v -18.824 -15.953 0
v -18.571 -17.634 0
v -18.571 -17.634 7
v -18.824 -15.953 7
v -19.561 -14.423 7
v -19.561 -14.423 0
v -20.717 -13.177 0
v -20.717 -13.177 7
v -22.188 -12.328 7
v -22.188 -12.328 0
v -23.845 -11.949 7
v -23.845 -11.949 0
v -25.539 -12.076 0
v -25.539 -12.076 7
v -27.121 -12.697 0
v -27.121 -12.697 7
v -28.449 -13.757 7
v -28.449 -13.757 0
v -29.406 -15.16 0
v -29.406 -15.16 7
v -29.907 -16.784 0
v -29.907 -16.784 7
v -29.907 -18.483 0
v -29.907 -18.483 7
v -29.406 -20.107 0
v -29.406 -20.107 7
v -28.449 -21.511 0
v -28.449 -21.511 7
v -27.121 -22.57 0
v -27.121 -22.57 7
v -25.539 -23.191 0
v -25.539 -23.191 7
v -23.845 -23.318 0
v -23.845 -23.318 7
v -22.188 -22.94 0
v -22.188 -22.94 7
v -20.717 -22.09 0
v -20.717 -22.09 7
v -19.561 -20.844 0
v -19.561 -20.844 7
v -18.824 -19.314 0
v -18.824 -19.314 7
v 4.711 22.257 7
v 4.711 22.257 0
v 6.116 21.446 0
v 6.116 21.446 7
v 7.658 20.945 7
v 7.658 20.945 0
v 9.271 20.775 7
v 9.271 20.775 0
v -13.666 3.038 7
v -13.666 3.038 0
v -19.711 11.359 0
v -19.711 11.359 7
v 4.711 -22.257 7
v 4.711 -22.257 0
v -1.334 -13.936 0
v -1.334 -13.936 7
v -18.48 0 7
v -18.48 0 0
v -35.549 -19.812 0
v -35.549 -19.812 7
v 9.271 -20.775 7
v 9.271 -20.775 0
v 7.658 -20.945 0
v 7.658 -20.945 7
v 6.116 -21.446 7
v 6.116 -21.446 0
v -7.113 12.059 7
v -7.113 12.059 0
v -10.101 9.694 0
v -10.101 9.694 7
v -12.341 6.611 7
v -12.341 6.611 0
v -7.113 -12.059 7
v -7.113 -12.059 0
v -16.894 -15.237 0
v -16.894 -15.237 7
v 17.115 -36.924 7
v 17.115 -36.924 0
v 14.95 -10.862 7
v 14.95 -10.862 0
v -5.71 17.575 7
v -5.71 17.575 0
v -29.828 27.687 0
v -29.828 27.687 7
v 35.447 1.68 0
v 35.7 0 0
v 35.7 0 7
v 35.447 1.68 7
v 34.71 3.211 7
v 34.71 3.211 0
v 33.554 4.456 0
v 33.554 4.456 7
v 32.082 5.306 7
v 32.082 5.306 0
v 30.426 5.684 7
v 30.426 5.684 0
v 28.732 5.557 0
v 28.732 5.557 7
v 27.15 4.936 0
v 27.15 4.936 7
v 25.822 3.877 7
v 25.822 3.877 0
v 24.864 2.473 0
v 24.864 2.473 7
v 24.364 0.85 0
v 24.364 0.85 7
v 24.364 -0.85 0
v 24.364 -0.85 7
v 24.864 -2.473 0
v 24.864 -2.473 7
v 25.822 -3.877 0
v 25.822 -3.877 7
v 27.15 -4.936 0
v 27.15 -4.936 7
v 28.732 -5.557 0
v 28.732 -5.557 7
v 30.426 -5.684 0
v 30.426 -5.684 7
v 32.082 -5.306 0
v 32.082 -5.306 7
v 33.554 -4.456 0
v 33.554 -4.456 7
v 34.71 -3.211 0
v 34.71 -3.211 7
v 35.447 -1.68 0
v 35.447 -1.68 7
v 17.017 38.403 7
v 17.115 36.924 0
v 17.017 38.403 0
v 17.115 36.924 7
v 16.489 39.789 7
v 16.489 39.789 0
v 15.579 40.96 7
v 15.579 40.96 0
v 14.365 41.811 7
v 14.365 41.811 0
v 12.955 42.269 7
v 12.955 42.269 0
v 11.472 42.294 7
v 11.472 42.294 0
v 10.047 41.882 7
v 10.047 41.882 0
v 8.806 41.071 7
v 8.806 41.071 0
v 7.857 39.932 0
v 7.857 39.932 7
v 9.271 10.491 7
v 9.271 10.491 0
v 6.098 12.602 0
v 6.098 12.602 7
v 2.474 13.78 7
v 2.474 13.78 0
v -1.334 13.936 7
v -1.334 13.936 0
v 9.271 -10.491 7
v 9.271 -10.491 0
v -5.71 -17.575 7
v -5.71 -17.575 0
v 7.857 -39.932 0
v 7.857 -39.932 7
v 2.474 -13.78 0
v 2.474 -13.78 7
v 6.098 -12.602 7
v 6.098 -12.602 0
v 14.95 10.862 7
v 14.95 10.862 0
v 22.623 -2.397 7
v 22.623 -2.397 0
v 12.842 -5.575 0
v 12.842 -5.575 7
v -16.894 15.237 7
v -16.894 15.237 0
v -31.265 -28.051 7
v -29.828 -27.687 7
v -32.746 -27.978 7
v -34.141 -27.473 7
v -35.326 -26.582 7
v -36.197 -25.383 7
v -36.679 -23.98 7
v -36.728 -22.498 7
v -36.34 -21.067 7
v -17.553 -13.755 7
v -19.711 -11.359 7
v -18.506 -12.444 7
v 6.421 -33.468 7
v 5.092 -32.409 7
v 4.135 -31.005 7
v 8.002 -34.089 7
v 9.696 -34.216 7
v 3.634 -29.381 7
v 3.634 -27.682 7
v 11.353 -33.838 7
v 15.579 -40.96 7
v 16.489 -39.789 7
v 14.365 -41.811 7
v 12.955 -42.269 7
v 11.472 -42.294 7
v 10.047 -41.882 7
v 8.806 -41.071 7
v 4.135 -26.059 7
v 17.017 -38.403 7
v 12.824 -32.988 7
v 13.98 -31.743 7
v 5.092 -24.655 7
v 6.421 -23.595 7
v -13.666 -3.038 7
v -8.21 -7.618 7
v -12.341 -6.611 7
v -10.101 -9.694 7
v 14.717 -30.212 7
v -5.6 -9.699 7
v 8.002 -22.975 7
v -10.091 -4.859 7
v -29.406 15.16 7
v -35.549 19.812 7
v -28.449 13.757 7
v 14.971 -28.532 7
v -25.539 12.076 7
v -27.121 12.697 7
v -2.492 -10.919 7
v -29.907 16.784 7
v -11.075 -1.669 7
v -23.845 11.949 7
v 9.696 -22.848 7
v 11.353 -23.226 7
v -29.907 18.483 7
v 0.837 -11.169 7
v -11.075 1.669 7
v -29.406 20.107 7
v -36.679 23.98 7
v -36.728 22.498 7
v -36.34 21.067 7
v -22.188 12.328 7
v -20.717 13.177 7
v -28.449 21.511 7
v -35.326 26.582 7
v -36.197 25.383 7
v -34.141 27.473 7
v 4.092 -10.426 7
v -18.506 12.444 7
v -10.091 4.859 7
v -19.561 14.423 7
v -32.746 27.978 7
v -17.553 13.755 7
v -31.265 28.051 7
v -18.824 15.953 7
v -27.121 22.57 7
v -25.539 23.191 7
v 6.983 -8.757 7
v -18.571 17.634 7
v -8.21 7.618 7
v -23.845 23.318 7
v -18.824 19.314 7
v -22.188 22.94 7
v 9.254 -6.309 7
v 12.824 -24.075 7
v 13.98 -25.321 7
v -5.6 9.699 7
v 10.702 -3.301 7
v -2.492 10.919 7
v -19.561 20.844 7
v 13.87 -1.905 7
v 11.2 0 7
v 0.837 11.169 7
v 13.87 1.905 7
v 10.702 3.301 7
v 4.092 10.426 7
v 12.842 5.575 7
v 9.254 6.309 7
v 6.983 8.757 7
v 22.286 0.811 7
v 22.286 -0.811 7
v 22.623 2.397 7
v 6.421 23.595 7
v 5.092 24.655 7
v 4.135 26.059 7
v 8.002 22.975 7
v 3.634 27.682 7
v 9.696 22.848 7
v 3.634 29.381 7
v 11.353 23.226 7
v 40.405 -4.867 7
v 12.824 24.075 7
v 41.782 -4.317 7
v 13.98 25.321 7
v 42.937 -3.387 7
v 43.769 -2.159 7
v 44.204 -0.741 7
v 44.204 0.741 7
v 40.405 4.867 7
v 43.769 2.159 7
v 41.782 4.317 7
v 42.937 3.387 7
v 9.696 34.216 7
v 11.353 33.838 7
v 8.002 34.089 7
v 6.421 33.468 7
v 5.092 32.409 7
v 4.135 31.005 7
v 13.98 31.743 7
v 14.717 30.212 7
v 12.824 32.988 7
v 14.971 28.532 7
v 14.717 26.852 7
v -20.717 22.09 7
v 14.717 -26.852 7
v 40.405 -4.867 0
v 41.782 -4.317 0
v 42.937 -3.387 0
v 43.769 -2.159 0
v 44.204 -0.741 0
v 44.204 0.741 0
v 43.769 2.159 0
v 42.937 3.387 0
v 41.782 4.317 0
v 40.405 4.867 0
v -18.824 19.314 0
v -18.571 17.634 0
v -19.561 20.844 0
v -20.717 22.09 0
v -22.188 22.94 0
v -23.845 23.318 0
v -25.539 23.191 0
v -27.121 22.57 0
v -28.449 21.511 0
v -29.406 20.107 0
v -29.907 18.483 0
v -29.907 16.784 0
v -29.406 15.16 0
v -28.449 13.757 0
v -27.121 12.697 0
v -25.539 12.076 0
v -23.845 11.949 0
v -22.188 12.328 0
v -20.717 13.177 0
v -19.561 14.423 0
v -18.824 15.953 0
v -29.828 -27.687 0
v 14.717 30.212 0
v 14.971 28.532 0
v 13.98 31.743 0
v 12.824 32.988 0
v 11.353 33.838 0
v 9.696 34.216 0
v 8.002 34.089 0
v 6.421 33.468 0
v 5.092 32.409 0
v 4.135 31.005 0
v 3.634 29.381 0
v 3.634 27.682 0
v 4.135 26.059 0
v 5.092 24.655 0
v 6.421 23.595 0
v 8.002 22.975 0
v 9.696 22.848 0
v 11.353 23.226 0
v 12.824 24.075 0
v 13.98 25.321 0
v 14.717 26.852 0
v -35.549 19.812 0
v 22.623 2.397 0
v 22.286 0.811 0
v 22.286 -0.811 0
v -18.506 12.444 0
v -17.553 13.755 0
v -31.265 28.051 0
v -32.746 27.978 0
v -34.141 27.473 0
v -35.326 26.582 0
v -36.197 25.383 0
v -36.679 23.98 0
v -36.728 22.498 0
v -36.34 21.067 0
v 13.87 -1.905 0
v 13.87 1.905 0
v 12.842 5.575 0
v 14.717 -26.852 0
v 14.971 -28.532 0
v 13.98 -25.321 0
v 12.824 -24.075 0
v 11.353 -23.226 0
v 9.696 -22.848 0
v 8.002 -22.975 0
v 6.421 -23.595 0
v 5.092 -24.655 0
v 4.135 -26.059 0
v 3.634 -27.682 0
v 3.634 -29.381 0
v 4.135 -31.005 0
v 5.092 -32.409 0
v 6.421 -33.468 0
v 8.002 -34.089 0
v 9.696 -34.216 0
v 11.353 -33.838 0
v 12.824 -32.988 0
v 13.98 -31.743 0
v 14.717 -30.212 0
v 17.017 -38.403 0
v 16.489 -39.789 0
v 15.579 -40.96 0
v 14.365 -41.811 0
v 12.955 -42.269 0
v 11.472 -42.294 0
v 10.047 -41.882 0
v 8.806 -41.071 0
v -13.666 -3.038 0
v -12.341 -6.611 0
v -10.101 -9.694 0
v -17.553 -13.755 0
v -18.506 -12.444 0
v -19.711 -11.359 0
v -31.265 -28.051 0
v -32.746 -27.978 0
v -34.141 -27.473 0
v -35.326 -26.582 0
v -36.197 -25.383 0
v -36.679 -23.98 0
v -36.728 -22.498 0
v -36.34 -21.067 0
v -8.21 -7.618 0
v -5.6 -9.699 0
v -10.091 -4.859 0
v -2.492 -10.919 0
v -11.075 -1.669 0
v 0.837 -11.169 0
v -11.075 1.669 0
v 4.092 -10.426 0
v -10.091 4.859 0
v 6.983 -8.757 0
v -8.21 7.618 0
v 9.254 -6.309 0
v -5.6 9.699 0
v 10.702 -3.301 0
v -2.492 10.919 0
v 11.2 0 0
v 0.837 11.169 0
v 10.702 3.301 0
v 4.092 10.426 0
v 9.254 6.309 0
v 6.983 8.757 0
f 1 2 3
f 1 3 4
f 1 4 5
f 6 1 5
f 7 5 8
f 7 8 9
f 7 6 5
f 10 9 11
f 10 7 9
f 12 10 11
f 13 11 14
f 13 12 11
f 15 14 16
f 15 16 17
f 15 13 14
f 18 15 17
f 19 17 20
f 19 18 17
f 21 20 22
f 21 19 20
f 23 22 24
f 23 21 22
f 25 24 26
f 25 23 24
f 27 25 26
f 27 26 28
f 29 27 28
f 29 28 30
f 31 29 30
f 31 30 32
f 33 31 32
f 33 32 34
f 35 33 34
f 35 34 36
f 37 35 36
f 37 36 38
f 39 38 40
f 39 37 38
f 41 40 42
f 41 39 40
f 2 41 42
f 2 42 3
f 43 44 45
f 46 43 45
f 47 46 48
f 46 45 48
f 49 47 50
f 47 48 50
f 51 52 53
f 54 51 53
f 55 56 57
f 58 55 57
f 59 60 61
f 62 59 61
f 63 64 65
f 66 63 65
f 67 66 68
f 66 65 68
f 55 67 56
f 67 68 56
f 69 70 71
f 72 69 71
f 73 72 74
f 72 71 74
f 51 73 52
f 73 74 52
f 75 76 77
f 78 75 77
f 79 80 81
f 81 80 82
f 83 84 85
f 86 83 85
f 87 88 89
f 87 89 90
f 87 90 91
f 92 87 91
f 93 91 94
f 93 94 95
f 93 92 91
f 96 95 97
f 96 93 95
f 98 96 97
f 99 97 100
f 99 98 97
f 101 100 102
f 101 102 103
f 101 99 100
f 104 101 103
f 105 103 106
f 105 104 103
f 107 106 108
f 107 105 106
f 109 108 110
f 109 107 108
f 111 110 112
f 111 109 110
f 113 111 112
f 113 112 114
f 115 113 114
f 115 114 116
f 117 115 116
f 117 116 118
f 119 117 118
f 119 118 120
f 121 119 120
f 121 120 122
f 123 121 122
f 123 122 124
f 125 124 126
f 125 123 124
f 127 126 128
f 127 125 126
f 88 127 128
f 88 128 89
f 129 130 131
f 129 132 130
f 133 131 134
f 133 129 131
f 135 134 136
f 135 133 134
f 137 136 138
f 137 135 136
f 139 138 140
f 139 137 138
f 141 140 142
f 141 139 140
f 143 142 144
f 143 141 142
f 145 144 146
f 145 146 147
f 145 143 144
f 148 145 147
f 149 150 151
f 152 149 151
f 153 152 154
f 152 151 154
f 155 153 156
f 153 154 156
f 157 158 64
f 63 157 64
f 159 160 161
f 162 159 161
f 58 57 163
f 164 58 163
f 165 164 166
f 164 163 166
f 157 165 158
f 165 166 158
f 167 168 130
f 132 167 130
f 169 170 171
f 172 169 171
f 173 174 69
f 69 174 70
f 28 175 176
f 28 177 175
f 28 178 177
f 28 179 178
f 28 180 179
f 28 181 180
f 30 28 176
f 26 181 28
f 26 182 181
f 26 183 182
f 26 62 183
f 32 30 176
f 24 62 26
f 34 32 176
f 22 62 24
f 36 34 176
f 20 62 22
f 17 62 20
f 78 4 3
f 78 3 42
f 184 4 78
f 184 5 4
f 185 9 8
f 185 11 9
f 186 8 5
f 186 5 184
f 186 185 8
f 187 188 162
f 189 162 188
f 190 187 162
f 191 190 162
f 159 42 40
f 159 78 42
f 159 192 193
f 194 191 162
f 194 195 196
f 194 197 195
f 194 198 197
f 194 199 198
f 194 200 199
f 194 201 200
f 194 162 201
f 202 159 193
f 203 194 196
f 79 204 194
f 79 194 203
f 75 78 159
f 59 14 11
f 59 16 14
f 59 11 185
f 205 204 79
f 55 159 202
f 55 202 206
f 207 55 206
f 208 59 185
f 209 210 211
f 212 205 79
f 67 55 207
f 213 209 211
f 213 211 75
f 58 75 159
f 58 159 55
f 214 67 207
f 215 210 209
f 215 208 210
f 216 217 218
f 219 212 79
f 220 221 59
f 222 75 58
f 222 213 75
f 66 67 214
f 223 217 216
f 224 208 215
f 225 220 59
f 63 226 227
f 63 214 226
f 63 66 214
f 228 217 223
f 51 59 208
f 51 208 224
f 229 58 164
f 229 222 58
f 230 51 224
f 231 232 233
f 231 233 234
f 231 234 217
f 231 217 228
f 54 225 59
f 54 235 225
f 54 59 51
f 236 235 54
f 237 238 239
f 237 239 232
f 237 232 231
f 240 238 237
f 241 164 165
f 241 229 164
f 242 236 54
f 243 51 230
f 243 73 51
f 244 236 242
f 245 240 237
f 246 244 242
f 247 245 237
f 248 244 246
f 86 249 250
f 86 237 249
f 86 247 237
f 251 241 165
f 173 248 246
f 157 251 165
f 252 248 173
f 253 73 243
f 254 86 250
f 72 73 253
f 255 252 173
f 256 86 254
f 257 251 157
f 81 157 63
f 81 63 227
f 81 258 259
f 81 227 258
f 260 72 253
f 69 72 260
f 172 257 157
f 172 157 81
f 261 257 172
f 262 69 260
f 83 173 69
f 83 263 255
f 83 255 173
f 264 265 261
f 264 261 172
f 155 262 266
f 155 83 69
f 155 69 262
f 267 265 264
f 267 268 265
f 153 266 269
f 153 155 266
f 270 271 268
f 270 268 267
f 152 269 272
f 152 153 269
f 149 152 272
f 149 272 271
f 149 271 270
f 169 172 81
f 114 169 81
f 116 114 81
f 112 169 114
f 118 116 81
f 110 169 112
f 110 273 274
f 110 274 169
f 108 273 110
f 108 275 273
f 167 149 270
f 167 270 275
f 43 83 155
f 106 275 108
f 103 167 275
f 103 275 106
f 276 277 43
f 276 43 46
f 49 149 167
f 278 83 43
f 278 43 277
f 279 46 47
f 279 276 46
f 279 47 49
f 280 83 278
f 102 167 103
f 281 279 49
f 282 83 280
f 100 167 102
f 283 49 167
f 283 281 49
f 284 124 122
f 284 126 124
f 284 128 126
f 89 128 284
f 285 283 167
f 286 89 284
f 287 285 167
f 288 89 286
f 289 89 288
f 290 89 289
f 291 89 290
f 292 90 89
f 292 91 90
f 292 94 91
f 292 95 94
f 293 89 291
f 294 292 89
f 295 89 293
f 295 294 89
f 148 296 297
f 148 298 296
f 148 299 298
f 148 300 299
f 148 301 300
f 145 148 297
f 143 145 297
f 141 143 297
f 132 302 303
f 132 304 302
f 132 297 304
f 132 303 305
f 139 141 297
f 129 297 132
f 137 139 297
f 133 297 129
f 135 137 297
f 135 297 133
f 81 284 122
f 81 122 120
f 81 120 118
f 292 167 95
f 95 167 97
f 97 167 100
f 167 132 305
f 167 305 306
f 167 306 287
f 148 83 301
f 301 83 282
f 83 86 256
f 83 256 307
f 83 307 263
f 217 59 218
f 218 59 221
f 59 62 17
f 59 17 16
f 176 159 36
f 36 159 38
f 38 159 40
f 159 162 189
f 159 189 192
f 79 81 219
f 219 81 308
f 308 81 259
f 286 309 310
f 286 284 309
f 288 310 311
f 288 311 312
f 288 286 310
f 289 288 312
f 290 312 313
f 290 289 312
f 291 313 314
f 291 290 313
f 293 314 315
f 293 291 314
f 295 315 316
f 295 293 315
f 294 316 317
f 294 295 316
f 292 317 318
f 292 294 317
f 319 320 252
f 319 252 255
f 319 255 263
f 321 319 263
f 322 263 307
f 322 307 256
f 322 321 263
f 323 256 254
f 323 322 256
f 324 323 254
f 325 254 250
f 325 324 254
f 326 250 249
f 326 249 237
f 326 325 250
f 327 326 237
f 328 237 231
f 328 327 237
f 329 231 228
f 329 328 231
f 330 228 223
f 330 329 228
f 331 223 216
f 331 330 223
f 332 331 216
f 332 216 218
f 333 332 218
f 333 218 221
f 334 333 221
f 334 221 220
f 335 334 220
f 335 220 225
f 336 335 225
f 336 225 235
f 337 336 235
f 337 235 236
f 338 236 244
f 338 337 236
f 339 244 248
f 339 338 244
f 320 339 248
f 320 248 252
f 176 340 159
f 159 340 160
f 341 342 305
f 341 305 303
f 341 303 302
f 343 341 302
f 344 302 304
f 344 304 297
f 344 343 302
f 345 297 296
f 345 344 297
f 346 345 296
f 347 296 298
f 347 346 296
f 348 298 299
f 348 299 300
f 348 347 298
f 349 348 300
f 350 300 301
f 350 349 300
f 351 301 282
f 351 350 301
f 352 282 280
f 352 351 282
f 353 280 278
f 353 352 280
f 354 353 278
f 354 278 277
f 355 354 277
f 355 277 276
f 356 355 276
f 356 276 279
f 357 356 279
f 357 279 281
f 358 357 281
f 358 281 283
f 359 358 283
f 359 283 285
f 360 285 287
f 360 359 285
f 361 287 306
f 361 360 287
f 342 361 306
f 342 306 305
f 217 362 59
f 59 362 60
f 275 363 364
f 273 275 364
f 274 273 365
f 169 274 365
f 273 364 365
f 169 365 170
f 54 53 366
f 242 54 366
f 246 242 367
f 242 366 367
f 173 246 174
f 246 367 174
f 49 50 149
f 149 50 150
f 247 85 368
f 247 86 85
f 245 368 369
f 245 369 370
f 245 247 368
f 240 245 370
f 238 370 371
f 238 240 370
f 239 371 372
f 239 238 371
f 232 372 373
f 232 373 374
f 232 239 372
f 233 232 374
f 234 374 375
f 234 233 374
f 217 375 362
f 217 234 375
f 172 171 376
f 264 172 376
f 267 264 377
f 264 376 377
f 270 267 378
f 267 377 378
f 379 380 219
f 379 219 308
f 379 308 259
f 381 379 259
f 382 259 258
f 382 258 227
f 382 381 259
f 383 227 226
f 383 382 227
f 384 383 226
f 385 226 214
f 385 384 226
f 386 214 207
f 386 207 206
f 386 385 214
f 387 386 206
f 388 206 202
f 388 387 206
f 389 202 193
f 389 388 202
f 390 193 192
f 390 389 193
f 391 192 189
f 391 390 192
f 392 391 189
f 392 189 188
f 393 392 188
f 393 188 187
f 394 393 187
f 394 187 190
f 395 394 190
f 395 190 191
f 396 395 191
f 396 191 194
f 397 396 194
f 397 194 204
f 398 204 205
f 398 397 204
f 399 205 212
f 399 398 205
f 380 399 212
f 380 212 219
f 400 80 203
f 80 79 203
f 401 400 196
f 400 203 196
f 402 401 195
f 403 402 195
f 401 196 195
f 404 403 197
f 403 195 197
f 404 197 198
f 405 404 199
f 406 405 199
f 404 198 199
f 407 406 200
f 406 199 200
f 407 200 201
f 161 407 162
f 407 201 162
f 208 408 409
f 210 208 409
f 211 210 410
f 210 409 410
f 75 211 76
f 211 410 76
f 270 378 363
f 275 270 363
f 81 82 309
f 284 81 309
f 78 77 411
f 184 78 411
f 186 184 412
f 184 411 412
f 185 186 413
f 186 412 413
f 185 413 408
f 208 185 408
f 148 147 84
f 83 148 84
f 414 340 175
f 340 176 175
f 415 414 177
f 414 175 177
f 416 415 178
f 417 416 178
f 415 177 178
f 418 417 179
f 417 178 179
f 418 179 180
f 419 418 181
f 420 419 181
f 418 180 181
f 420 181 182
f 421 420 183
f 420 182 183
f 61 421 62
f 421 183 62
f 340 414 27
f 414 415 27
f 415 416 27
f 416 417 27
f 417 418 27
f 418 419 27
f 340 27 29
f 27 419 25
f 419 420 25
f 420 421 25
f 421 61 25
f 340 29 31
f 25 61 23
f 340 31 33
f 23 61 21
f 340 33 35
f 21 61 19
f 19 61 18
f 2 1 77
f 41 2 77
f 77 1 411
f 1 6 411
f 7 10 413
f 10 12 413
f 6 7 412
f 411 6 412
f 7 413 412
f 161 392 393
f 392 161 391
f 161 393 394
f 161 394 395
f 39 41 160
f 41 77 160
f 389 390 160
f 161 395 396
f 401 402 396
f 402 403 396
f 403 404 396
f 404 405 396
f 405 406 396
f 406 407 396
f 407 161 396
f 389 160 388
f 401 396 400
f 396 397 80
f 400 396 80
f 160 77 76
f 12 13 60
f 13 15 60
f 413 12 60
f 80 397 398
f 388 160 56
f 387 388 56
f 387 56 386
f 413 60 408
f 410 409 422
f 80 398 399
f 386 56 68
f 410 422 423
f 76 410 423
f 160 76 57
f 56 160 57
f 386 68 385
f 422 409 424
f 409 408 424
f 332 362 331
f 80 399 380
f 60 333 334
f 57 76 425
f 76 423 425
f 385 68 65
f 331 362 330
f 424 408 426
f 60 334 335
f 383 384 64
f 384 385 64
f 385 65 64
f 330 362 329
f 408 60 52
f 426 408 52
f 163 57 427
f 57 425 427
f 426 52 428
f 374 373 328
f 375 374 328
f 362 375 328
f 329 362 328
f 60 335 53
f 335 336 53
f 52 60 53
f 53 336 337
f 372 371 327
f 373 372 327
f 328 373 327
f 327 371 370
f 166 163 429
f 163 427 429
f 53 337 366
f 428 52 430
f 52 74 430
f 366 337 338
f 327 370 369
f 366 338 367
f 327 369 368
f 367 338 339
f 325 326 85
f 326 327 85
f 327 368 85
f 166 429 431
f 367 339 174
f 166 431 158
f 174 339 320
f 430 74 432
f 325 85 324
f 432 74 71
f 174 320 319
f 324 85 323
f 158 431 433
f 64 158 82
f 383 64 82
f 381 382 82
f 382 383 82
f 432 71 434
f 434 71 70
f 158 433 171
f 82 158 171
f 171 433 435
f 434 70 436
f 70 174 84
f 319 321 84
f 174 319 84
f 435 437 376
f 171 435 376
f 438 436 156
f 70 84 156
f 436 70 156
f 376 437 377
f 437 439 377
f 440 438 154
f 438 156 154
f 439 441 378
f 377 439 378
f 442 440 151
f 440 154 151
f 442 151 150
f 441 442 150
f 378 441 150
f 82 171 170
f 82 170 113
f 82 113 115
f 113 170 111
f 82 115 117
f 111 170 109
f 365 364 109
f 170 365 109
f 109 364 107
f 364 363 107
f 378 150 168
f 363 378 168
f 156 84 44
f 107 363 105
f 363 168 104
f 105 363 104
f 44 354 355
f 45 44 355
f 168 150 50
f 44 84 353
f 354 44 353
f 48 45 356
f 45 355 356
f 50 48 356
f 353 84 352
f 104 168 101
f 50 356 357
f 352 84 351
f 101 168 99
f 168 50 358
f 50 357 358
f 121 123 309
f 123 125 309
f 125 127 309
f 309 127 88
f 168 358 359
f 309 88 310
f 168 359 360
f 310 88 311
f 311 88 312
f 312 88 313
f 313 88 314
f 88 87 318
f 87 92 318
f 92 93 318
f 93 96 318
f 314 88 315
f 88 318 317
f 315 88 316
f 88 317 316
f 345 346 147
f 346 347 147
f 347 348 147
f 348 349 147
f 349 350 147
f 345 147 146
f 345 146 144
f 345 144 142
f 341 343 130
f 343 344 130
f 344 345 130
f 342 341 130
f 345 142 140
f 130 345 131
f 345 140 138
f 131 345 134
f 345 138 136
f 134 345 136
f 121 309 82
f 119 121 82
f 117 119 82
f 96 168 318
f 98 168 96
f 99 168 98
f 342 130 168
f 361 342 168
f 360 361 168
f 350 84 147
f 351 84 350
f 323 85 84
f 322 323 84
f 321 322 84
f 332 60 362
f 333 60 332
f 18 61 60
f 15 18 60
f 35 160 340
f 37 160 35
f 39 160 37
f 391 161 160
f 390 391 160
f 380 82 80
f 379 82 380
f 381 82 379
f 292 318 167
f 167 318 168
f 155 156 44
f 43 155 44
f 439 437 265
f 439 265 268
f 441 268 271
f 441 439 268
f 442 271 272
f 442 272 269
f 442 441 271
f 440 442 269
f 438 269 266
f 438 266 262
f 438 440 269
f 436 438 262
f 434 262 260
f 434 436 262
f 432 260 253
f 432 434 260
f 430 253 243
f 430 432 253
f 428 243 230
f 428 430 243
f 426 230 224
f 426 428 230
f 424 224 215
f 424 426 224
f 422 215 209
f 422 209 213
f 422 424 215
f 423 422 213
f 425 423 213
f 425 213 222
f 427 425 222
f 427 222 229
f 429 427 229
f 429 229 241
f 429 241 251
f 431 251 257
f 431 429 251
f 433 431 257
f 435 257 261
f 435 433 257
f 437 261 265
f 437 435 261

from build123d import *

# Parameters (mm, degrees)
F0_R     = 5.7
F0_R_2   = 11.2
F1_DEPTH = 7
F2_R     = 5


with BuildPart() as f1:
    # F0 (on Top) → F1 (new body)
    with BuildSketch(Plane.XY):
        Polygon((14.950241, -10.861986), (61.069731, 0), (14.950241, 10.861986), (18.871585, 58.080765), (-5.710484, 17.575063), (-49.40645, 35.895887), (-18.479514, 0), (-49.40645, -35.895887), (-5.710484, -17.575063), (18.871585, -58.080765), align=None)
        with Locations((-24.27051, -17.633558)):
            Circle(F0_R, mode=Mode.SUBTRACT)
        with BuildLine():
            Line((9.27051, -10.490836), (9.27051, -20.77537))
            ThreePointArc((9.27051, -20.77537), (6.873673, -21.154992), (4.711456, -22.256696))
            Line((4.711456, -22.256696), (-1.333641, -13.936334))
            ThreePointArc((-1.333641, -13.936334), (4.326238, -13.314791), (9.27051, -10.490836))
        make_face(mode=Mode.SUBTRACT)
        with BuildLine():
            Line((-7.112633, -12.058626), (-16.893806, -15.236721))
            ThreePointArc((-16.893806, -15.236721), (-17.995511, -13.074504), (-19.711456, -11.358558))
            Line((-19.711456, -11.358558), (-13.666359, -3.038196))
            ThreePointArc((-13.666359, -3.038196), (-11.326238, -8.228994), (-7.112633, -12.058626))
        make_face(mode=Mode.SUBTRACT)
        Circle(F0_R_2, mode=Mode.SUBTRACT)
        with Locations((9.27051, -28.531695)):
            Circle(F0_R, mode=Mode.SUBTRACT)
        with BuildLine():
            ThreePointArc((22.623296, 2.396836), (22.243675, 0), (22.623296, -2.396836))
            Line((22.623296, -2.396836), (12.842123, -5.574932))
            ThreePointArc((12.842123, -5.574932), (14, 0), (12.842123, 5.574932))
            Line((12.842123, 5.574932), (22.623296, 2.396836))
        make_face(mode=Mode.SUBTRACT)
        with Locations((30, 0)):
            Circle(F0_R, mode=Mode.SUBTRACT)
        with Locations((-24.27051, 17.633558)):
            Circle(F0_R, mode=Mode.SUBTRACT)
        with BuildLine():
            Line((-13.666359, 3.038196), (-19.711456, 11.358558))
            ThreePointArc((-19.711456, 11.358558), (-17.995511, 13.074504), (-16.893806, 15.236721))
            Line((-16.893806, 15.236721), (-7.112633, 12.058626))
            ThreePointArc((-7.112633, 12.058626), (-11.326238, 8.228994), (-13.666359, 3.038196))
        make_face(mode=Mode.SUBTRACT)
        with BuildLine():
            Line((9.27051, 20.77537), (9.27051, 10.490836))
            ThreePointArc((9.27051, 10.490836), (4.326238, 13.314791), (-1.333641, 13.936334))
            Line((-1.333641, 13.936334), (4.711456, 22.256696))
            ThreePointArc((4.711456, 22.256696), (6.873673, 21.154992), (9.27051, 20.77537))
        make_face(mode=Mode.SUBTRACT)
        with Locations((9.27051, 28.531695)):
            Circle(F0_R, mode=Mode.SUBTRACT)
    extrude(amount=F1_DEPTH)

    # F2
    f2_edges = [f1.edges().sort_by_distance(p)[0] for p in [
        (18.871585, -58.080765, 3.5),
        (61.069731, 0, 3.5),
        (18.871585, 58.080765, 3.5),
        (-49.40645, 35.895887, 3.5),
        (-49.40645, -35.895887, 3.5),
    ]]
    fillet(f2_edges, radius=F2_R)


solid = f1.part
